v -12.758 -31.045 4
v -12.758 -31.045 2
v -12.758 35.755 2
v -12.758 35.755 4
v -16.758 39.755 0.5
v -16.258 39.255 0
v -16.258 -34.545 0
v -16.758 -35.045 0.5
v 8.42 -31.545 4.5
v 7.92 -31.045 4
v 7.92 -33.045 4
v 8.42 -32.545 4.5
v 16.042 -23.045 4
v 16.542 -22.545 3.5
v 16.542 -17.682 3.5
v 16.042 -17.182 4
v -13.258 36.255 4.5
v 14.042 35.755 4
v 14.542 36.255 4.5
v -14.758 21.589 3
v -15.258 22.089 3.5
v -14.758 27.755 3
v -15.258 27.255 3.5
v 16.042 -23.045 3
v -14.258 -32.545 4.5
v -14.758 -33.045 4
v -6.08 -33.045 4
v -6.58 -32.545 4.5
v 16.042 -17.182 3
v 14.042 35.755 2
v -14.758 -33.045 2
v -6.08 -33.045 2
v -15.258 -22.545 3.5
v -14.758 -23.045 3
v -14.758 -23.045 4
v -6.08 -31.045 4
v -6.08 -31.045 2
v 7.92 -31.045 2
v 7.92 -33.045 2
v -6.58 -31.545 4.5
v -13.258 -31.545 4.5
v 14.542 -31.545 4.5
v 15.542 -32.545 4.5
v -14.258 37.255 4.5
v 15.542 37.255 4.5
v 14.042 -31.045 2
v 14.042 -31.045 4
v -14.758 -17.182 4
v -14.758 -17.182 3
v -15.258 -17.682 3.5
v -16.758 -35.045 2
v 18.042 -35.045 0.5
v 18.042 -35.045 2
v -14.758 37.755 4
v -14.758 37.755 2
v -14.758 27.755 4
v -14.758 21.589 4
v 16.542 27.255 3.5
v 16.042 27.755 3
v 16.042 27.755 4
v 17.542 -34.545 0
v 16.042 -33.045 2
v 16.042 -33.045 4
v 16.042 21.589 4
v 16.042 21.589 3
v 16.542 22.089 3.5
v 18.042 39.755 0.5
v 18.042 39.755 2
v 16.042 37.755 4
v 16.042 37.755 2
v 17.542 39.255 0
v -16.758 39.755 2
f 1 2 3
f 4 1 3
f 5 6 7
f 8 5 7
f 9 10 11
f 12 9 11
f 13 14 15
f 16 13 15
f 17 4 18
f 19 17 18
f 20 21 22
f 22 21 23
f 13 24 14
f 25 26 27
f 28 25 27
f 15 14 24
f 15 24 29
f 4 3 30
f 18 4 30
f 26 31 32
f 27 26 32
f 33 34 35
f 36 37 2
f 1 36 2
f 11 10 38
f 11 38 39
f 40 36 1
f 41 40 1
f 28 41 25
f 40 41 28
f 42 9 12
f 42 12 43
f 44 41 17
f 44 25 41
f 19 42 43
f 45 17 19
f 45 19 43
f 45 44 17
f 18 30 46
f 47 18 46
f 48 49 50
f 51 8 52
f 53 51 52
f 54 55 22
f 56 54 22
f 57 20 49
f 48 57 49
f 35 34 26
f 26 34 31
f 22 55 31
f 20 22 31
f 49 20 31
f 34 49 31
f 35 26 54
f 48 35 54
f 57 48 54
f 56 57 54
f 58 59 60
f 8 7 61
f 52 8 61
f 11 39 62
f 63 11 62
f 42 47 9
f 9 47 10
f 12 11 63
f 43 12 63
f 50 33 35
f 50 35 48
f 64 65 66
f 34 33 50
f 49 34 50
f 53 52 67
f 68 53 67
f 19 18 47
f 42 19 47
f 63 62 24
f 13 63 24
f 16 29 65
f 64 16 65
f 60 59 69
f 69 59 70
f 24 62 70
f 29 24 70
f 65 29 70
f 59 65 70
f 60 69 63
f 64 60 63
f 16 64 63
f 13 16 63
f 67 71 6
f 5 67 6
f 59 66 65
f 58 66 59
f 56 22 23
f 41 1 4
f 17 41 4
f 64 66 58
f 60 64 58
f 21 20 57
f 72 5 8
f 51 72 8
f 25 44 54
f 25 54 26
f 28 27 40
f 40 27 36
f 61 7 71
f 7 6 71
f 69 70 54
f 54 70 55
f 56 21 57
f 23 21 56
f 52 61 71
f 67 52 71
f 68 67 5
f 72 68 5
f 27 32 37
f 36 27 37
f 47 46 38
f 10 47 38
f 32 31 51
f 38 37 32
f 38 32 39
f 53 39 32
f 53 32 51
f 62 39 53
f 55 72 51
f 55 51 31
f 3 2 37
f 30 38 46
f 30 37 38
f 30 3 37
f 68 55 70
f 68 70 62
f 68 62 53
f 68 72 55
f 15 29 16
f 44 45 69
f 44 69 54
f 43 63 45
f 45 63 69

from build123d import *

# Parameters (mm, degrees)
F1_W     = 2
F1_H     = 6.165323171
F1_H_2   = 5.8635988384
F1_H_3   = 38.7710779905
F1_W_2   = 14
F1_H_4   = 2
F1_W_3   = 26.8
F1_H_5   = 8
F1_W_4   = 0.5
F2_DEPTH = 2
F3_START = 1
F3_DEPTH = 3.5
F4_START = 3
F4_DEPTH = 1
F5_SIZE  = 0.49999


# Not quite as in the source:
# - a fillet or chamfer is up to 0.001 mm smaller than in the source, because OpenCascade refuses the exact size


with BuildPart() as f2:
    # F1 (on Top) → F2 (new body)
    with BuildSketch(Plane.XY):
        Polygon((16.0419130247, 37.7546238333), (-14.7580869753, 37.7546238333), (-14.7580869753, 27.7546238333), (-12.7580869753, 27.7546238333), (-12.7580869753, 35.7546238333), (14.0419130247, 35.7546238333), (14.0419130247, 27.7546238333), (16.0419130247, 27.7546238333), align=None)
        Polygon((-12.7580869753, -23.0453761667), (-14.7580869753, -23.0453761667), (-14.7580869753, -26.0453761667), (-14.7580869753, -33.0453761667), (-6.0801735182, -33.0453761667), (-6.0801735182, -31.0453761667), (-12.7580869753, -31.0453761667), align=None)
        with Locations((-13.7580869753, 24.6719622478)):
            Rectangle(F1_W, F1_H)
        with Locations((-13.7580869753, -20.1135767475)):
            Rectangle(F1_W, F1_H_2)
        Polygon((-12.7580869753, 21.5893006623), (-14.7580869753, 21.5893006623), (-14.7580869753, -3.2453761667), (-14.7580869753, -17.1817773283), (-12.7580869753, -17.1817773283), align=None)
        with Locations((15.0419130247, 2.203761667)):
            Rectangle(F1_W, F1_H_3)
        with Locations((15.0419130247, -20.1135767475)):
            Rectangle(F1_W, F1_H_2)
        Polygon((16.0419130247, -33.0453761667), (16.0419130247, -23.0453761667), (14.0419130247, -23.0453761667), (14.0419130247, -31.0453761667), (7.9198264818, -31.0453761667), (7.9198264818, -33.0453761667), align=None)
        with Locations((15.0419130247, 24.6719622478)):
            Rectangle(F1_W, F1_H)
        Polygon((-14.7580869753, -26.0453761667), (-16.7580869753, -26.0453761667), (-16.7580869753, -35.0453761667), (-6.0801735182, -35.0453761667), (-6.0801735182, -33.0453761667), (-14.7580869753, -33.0453761667), align=None)
        with Locations((0.9198264818, -32.0453761667)):
            Rectangle(F1_W_2, F1_H_4)
        with Locations((0.9198264818, -34.0453761667)):
            Rectangle(F1_W_2, F1_H_4)
        with Locations((0.6419130247, 24.6719622478)):
            Rectangle(F1_W_3, F1_H)
        with Locations((0.6419130247, 2.203761667)):
            Rectangle(F1_W_3, F1_H_3)
        Polygon((14.0419130247, -23.0453761667), (-12.7580869753, -23.0453761667), (-12.7580869753, -31.0453761667), (-6.0801735182, -31.0453761667), (7.9198264818, -31.0453761667), (14.0419130247, -31.0453761667), align=None)
        Polygon((-14.7580869753, 27.7546238333), (-14.7580869753, 37.7546238333), (16.0419130247, 37.7546238333), (16.0419130247, 27.7546238333), (16.5419130247, 27.7546238333), (16.5419130247, 21.5893006623), (16.0419130247, 21.5893006623), (16.0419130247, -17.1817773283), (16.5419130247, -17.1817773283), (16.5419130247, -23.0453761667), (16.0419130247, -23.0453761667), (16.0419130247, -33.0453761667), (7.9198264818, -33.0453761667), (7.9198264818, -35.0453761667), (18.0419130247, -35.0453761667), (18.0419130247, 39.7546238333), (-16.7580869753, 39.7546238333), (-16.7580869753, -3.2453761667), (-14.7580869753, -3.2453761667), (-14.7580869753, 21.5893006623), (-15.2580869753, 21.5893006623), (-15.2580869753, 27.7546238333), align=None)
        with Locations((0.6419130247, 31.7546238333)):
            Rectangle(F1_W_3, F1_H_5)
        Polygon((-14.7580869753, -17.1817773283), (-14.7580869753, -3.2453761667), (-16.7580869753, -3.2453761667), (-16.7580869753, -26.0453761667), (-14.7580869753, -26.0453761667), (-14.7580869753, -23.0453761667), (-15.2580869753, -23.0453761667), (-15.2580869753, -17.1817773283), align=None)
        with Locations((0.6419130247, -20.1135767475)):
            Rectangle(F1_W_3, F1_H_2)
        with Locations((-15.0080869753, -20.1135767475)):
            Rectangle(F1_W_4, F1_H_2)
        with Locations((-15.0080869753, 24.6719622478)):
            Rectangle(F1_W_4, F1_H)
        with Locations((16.2919130247, -20.1135767475)):
            Rectangle(F1_W_4, F1_H_2)
        with Locations((16.2919130247, 24.6719622478)):
            Rectangle(F1_W_4, F1_H)
    extrude(amount=F2_DEPTH)

    # F1 (on Top) → F3 (join)
    with BuildSketch(Plane.XY.offset(F3_START)):
        Polygon((16.0419130247, 37.7546238333), (-14.7580869753, 37.7546238333), (-14.7580869753, 27.7546238333), (-12.7580869753, 27.7546238333), (-12.7580869753, 35.7546238333), (14.0419130247, 35.7546238333), (14.0419130247, 27.7546238333), (16.0419130247, 27.7546238333), align=None)
        with Locations((-13.7580869753, 24.6719622478)):
            Rectangle(F1_W, F1_H)
        with Locations((15.0419130247, 24.6719622478)):
            Rectangle(F1_W, F1_H)
        with Locations((15.0419130247, 2.203761667)):
            Rectangle(F1_W, F1_H_3)
        Polygon((-12.7580869753, 21.5893006623), (-14.7580869753, 21.5893006623), (-14.7580869753, -3.2453761667), (-14.7580869753, -17.1817773283), (-12.7580869753, -17.1817773283), align=None)
        with Locations((15.0419130247, -20.1135767475)):
            Rectangle(F1_W, F1_H_2)
        Polygon((16.0419130247, -33.0453761667), (16.0419130247, -23.0453761667), (14.0419130247, -23.0453761667), (14.0419130247, -31.0453761667), (7.9198264818, -31.0453761667), (7.9198264818, -33.0453761667), align=None)
        Polygon((-12.7580869753, -23.0453761667), (-14.7580869753, -23.0453761667), (-14.7580869753, -26.0453761667), (-14.7580869753, -33.0453761667), (-6.0801735182, -33.0453761667), (-6.0801735182, -31.0453761667), (-12.7580869753, -31.0453761667), align=None)
        with Locations((-13.7580869753, -20.1135767475)):
            Rectangle(F1_W, F1_H_2)
    extrude(amount=F3_DEPTH)

    # F1 (on Top) → F4 (join)
    with BuildSketch(Plane.XY.offset(F4_START)):
        with Locations((-15.0080869753, 24.6719622478)):
            Rectangle(F1_W_4, F1_H)
        with Locations((-15.0080869753, -20.1135767475)):
            Rectangle(F1_W_4, F1_H_2)
        with Locations((16.2919130247, -20.1135767475)):
            Rectangle(F1_W_4, F1_H_2)
        with Locations((16.2919130247, 24.6719622478)):
            Rectangle(F1_W_4, F1_H)
    extrude(amount=F4_DEPTH)

    # F5 (size 0.5 in the source; OpenCascade refuses exactly that, so slightly less here)
    f5_edges = [f2.edges().sort_by_distance(p)[0] for p in [
        (0.641913, -35.045376, 0),
        (18.041913, 2.354624, 0),
        (0.641913, 39.754624, 0),
        (-16.758087, 2.354624, 0),
        (16.541913, -23.045376, 3.5),
        (16.541913, -17.181777, 3.5),
        (16.541913, -20.113577, 3),
        (16.541913, -20.113577, 4),
        (16.541913, 21.589301, 3.5),
        (16.541913, 27.754624, 3.5),
        (16.541913, 24.671962, 3),
        (16.541913, 24.671962, 4),
        (-15.258087, 27.754624, 3.5),
        (-15.258087, 21.589301, 3.5),
        (-15.258087, 24.671962, 3),
        (-15.258087, 24.671962, 4),
        (-15.258087, -17.181777, 3.5),
        (-15.258087, -23.045376, 3.5),
        (-15.258087, -20.113577, 3),
        (-15.258087, -20.113577, 4),
        (0.641913, 37.754624, 4.5),
        (-14.758087, 2.354624, 4.5),
        (-10.41913, -33.045376, 4.5),
        (-6.080174, -32.045376, 4.5),
        (-9.41913, -31.045376, 4.5),
        (-12.758087, 2.354624, 4.5),
        (0.641913, 35.754624, 4.5),
        (14.041913, 2.354624, 4.5),
        (10.98087, -31.045376, 4.5),
        (7.919826, -32.045376, 4.5),
        (11.98087, -33.045376, 4.5),
        (16.041913, 2.354624, 4.5),
    ]]
    chamfer(f5_edges, length=F5_SIZE)


solid = f2.part
